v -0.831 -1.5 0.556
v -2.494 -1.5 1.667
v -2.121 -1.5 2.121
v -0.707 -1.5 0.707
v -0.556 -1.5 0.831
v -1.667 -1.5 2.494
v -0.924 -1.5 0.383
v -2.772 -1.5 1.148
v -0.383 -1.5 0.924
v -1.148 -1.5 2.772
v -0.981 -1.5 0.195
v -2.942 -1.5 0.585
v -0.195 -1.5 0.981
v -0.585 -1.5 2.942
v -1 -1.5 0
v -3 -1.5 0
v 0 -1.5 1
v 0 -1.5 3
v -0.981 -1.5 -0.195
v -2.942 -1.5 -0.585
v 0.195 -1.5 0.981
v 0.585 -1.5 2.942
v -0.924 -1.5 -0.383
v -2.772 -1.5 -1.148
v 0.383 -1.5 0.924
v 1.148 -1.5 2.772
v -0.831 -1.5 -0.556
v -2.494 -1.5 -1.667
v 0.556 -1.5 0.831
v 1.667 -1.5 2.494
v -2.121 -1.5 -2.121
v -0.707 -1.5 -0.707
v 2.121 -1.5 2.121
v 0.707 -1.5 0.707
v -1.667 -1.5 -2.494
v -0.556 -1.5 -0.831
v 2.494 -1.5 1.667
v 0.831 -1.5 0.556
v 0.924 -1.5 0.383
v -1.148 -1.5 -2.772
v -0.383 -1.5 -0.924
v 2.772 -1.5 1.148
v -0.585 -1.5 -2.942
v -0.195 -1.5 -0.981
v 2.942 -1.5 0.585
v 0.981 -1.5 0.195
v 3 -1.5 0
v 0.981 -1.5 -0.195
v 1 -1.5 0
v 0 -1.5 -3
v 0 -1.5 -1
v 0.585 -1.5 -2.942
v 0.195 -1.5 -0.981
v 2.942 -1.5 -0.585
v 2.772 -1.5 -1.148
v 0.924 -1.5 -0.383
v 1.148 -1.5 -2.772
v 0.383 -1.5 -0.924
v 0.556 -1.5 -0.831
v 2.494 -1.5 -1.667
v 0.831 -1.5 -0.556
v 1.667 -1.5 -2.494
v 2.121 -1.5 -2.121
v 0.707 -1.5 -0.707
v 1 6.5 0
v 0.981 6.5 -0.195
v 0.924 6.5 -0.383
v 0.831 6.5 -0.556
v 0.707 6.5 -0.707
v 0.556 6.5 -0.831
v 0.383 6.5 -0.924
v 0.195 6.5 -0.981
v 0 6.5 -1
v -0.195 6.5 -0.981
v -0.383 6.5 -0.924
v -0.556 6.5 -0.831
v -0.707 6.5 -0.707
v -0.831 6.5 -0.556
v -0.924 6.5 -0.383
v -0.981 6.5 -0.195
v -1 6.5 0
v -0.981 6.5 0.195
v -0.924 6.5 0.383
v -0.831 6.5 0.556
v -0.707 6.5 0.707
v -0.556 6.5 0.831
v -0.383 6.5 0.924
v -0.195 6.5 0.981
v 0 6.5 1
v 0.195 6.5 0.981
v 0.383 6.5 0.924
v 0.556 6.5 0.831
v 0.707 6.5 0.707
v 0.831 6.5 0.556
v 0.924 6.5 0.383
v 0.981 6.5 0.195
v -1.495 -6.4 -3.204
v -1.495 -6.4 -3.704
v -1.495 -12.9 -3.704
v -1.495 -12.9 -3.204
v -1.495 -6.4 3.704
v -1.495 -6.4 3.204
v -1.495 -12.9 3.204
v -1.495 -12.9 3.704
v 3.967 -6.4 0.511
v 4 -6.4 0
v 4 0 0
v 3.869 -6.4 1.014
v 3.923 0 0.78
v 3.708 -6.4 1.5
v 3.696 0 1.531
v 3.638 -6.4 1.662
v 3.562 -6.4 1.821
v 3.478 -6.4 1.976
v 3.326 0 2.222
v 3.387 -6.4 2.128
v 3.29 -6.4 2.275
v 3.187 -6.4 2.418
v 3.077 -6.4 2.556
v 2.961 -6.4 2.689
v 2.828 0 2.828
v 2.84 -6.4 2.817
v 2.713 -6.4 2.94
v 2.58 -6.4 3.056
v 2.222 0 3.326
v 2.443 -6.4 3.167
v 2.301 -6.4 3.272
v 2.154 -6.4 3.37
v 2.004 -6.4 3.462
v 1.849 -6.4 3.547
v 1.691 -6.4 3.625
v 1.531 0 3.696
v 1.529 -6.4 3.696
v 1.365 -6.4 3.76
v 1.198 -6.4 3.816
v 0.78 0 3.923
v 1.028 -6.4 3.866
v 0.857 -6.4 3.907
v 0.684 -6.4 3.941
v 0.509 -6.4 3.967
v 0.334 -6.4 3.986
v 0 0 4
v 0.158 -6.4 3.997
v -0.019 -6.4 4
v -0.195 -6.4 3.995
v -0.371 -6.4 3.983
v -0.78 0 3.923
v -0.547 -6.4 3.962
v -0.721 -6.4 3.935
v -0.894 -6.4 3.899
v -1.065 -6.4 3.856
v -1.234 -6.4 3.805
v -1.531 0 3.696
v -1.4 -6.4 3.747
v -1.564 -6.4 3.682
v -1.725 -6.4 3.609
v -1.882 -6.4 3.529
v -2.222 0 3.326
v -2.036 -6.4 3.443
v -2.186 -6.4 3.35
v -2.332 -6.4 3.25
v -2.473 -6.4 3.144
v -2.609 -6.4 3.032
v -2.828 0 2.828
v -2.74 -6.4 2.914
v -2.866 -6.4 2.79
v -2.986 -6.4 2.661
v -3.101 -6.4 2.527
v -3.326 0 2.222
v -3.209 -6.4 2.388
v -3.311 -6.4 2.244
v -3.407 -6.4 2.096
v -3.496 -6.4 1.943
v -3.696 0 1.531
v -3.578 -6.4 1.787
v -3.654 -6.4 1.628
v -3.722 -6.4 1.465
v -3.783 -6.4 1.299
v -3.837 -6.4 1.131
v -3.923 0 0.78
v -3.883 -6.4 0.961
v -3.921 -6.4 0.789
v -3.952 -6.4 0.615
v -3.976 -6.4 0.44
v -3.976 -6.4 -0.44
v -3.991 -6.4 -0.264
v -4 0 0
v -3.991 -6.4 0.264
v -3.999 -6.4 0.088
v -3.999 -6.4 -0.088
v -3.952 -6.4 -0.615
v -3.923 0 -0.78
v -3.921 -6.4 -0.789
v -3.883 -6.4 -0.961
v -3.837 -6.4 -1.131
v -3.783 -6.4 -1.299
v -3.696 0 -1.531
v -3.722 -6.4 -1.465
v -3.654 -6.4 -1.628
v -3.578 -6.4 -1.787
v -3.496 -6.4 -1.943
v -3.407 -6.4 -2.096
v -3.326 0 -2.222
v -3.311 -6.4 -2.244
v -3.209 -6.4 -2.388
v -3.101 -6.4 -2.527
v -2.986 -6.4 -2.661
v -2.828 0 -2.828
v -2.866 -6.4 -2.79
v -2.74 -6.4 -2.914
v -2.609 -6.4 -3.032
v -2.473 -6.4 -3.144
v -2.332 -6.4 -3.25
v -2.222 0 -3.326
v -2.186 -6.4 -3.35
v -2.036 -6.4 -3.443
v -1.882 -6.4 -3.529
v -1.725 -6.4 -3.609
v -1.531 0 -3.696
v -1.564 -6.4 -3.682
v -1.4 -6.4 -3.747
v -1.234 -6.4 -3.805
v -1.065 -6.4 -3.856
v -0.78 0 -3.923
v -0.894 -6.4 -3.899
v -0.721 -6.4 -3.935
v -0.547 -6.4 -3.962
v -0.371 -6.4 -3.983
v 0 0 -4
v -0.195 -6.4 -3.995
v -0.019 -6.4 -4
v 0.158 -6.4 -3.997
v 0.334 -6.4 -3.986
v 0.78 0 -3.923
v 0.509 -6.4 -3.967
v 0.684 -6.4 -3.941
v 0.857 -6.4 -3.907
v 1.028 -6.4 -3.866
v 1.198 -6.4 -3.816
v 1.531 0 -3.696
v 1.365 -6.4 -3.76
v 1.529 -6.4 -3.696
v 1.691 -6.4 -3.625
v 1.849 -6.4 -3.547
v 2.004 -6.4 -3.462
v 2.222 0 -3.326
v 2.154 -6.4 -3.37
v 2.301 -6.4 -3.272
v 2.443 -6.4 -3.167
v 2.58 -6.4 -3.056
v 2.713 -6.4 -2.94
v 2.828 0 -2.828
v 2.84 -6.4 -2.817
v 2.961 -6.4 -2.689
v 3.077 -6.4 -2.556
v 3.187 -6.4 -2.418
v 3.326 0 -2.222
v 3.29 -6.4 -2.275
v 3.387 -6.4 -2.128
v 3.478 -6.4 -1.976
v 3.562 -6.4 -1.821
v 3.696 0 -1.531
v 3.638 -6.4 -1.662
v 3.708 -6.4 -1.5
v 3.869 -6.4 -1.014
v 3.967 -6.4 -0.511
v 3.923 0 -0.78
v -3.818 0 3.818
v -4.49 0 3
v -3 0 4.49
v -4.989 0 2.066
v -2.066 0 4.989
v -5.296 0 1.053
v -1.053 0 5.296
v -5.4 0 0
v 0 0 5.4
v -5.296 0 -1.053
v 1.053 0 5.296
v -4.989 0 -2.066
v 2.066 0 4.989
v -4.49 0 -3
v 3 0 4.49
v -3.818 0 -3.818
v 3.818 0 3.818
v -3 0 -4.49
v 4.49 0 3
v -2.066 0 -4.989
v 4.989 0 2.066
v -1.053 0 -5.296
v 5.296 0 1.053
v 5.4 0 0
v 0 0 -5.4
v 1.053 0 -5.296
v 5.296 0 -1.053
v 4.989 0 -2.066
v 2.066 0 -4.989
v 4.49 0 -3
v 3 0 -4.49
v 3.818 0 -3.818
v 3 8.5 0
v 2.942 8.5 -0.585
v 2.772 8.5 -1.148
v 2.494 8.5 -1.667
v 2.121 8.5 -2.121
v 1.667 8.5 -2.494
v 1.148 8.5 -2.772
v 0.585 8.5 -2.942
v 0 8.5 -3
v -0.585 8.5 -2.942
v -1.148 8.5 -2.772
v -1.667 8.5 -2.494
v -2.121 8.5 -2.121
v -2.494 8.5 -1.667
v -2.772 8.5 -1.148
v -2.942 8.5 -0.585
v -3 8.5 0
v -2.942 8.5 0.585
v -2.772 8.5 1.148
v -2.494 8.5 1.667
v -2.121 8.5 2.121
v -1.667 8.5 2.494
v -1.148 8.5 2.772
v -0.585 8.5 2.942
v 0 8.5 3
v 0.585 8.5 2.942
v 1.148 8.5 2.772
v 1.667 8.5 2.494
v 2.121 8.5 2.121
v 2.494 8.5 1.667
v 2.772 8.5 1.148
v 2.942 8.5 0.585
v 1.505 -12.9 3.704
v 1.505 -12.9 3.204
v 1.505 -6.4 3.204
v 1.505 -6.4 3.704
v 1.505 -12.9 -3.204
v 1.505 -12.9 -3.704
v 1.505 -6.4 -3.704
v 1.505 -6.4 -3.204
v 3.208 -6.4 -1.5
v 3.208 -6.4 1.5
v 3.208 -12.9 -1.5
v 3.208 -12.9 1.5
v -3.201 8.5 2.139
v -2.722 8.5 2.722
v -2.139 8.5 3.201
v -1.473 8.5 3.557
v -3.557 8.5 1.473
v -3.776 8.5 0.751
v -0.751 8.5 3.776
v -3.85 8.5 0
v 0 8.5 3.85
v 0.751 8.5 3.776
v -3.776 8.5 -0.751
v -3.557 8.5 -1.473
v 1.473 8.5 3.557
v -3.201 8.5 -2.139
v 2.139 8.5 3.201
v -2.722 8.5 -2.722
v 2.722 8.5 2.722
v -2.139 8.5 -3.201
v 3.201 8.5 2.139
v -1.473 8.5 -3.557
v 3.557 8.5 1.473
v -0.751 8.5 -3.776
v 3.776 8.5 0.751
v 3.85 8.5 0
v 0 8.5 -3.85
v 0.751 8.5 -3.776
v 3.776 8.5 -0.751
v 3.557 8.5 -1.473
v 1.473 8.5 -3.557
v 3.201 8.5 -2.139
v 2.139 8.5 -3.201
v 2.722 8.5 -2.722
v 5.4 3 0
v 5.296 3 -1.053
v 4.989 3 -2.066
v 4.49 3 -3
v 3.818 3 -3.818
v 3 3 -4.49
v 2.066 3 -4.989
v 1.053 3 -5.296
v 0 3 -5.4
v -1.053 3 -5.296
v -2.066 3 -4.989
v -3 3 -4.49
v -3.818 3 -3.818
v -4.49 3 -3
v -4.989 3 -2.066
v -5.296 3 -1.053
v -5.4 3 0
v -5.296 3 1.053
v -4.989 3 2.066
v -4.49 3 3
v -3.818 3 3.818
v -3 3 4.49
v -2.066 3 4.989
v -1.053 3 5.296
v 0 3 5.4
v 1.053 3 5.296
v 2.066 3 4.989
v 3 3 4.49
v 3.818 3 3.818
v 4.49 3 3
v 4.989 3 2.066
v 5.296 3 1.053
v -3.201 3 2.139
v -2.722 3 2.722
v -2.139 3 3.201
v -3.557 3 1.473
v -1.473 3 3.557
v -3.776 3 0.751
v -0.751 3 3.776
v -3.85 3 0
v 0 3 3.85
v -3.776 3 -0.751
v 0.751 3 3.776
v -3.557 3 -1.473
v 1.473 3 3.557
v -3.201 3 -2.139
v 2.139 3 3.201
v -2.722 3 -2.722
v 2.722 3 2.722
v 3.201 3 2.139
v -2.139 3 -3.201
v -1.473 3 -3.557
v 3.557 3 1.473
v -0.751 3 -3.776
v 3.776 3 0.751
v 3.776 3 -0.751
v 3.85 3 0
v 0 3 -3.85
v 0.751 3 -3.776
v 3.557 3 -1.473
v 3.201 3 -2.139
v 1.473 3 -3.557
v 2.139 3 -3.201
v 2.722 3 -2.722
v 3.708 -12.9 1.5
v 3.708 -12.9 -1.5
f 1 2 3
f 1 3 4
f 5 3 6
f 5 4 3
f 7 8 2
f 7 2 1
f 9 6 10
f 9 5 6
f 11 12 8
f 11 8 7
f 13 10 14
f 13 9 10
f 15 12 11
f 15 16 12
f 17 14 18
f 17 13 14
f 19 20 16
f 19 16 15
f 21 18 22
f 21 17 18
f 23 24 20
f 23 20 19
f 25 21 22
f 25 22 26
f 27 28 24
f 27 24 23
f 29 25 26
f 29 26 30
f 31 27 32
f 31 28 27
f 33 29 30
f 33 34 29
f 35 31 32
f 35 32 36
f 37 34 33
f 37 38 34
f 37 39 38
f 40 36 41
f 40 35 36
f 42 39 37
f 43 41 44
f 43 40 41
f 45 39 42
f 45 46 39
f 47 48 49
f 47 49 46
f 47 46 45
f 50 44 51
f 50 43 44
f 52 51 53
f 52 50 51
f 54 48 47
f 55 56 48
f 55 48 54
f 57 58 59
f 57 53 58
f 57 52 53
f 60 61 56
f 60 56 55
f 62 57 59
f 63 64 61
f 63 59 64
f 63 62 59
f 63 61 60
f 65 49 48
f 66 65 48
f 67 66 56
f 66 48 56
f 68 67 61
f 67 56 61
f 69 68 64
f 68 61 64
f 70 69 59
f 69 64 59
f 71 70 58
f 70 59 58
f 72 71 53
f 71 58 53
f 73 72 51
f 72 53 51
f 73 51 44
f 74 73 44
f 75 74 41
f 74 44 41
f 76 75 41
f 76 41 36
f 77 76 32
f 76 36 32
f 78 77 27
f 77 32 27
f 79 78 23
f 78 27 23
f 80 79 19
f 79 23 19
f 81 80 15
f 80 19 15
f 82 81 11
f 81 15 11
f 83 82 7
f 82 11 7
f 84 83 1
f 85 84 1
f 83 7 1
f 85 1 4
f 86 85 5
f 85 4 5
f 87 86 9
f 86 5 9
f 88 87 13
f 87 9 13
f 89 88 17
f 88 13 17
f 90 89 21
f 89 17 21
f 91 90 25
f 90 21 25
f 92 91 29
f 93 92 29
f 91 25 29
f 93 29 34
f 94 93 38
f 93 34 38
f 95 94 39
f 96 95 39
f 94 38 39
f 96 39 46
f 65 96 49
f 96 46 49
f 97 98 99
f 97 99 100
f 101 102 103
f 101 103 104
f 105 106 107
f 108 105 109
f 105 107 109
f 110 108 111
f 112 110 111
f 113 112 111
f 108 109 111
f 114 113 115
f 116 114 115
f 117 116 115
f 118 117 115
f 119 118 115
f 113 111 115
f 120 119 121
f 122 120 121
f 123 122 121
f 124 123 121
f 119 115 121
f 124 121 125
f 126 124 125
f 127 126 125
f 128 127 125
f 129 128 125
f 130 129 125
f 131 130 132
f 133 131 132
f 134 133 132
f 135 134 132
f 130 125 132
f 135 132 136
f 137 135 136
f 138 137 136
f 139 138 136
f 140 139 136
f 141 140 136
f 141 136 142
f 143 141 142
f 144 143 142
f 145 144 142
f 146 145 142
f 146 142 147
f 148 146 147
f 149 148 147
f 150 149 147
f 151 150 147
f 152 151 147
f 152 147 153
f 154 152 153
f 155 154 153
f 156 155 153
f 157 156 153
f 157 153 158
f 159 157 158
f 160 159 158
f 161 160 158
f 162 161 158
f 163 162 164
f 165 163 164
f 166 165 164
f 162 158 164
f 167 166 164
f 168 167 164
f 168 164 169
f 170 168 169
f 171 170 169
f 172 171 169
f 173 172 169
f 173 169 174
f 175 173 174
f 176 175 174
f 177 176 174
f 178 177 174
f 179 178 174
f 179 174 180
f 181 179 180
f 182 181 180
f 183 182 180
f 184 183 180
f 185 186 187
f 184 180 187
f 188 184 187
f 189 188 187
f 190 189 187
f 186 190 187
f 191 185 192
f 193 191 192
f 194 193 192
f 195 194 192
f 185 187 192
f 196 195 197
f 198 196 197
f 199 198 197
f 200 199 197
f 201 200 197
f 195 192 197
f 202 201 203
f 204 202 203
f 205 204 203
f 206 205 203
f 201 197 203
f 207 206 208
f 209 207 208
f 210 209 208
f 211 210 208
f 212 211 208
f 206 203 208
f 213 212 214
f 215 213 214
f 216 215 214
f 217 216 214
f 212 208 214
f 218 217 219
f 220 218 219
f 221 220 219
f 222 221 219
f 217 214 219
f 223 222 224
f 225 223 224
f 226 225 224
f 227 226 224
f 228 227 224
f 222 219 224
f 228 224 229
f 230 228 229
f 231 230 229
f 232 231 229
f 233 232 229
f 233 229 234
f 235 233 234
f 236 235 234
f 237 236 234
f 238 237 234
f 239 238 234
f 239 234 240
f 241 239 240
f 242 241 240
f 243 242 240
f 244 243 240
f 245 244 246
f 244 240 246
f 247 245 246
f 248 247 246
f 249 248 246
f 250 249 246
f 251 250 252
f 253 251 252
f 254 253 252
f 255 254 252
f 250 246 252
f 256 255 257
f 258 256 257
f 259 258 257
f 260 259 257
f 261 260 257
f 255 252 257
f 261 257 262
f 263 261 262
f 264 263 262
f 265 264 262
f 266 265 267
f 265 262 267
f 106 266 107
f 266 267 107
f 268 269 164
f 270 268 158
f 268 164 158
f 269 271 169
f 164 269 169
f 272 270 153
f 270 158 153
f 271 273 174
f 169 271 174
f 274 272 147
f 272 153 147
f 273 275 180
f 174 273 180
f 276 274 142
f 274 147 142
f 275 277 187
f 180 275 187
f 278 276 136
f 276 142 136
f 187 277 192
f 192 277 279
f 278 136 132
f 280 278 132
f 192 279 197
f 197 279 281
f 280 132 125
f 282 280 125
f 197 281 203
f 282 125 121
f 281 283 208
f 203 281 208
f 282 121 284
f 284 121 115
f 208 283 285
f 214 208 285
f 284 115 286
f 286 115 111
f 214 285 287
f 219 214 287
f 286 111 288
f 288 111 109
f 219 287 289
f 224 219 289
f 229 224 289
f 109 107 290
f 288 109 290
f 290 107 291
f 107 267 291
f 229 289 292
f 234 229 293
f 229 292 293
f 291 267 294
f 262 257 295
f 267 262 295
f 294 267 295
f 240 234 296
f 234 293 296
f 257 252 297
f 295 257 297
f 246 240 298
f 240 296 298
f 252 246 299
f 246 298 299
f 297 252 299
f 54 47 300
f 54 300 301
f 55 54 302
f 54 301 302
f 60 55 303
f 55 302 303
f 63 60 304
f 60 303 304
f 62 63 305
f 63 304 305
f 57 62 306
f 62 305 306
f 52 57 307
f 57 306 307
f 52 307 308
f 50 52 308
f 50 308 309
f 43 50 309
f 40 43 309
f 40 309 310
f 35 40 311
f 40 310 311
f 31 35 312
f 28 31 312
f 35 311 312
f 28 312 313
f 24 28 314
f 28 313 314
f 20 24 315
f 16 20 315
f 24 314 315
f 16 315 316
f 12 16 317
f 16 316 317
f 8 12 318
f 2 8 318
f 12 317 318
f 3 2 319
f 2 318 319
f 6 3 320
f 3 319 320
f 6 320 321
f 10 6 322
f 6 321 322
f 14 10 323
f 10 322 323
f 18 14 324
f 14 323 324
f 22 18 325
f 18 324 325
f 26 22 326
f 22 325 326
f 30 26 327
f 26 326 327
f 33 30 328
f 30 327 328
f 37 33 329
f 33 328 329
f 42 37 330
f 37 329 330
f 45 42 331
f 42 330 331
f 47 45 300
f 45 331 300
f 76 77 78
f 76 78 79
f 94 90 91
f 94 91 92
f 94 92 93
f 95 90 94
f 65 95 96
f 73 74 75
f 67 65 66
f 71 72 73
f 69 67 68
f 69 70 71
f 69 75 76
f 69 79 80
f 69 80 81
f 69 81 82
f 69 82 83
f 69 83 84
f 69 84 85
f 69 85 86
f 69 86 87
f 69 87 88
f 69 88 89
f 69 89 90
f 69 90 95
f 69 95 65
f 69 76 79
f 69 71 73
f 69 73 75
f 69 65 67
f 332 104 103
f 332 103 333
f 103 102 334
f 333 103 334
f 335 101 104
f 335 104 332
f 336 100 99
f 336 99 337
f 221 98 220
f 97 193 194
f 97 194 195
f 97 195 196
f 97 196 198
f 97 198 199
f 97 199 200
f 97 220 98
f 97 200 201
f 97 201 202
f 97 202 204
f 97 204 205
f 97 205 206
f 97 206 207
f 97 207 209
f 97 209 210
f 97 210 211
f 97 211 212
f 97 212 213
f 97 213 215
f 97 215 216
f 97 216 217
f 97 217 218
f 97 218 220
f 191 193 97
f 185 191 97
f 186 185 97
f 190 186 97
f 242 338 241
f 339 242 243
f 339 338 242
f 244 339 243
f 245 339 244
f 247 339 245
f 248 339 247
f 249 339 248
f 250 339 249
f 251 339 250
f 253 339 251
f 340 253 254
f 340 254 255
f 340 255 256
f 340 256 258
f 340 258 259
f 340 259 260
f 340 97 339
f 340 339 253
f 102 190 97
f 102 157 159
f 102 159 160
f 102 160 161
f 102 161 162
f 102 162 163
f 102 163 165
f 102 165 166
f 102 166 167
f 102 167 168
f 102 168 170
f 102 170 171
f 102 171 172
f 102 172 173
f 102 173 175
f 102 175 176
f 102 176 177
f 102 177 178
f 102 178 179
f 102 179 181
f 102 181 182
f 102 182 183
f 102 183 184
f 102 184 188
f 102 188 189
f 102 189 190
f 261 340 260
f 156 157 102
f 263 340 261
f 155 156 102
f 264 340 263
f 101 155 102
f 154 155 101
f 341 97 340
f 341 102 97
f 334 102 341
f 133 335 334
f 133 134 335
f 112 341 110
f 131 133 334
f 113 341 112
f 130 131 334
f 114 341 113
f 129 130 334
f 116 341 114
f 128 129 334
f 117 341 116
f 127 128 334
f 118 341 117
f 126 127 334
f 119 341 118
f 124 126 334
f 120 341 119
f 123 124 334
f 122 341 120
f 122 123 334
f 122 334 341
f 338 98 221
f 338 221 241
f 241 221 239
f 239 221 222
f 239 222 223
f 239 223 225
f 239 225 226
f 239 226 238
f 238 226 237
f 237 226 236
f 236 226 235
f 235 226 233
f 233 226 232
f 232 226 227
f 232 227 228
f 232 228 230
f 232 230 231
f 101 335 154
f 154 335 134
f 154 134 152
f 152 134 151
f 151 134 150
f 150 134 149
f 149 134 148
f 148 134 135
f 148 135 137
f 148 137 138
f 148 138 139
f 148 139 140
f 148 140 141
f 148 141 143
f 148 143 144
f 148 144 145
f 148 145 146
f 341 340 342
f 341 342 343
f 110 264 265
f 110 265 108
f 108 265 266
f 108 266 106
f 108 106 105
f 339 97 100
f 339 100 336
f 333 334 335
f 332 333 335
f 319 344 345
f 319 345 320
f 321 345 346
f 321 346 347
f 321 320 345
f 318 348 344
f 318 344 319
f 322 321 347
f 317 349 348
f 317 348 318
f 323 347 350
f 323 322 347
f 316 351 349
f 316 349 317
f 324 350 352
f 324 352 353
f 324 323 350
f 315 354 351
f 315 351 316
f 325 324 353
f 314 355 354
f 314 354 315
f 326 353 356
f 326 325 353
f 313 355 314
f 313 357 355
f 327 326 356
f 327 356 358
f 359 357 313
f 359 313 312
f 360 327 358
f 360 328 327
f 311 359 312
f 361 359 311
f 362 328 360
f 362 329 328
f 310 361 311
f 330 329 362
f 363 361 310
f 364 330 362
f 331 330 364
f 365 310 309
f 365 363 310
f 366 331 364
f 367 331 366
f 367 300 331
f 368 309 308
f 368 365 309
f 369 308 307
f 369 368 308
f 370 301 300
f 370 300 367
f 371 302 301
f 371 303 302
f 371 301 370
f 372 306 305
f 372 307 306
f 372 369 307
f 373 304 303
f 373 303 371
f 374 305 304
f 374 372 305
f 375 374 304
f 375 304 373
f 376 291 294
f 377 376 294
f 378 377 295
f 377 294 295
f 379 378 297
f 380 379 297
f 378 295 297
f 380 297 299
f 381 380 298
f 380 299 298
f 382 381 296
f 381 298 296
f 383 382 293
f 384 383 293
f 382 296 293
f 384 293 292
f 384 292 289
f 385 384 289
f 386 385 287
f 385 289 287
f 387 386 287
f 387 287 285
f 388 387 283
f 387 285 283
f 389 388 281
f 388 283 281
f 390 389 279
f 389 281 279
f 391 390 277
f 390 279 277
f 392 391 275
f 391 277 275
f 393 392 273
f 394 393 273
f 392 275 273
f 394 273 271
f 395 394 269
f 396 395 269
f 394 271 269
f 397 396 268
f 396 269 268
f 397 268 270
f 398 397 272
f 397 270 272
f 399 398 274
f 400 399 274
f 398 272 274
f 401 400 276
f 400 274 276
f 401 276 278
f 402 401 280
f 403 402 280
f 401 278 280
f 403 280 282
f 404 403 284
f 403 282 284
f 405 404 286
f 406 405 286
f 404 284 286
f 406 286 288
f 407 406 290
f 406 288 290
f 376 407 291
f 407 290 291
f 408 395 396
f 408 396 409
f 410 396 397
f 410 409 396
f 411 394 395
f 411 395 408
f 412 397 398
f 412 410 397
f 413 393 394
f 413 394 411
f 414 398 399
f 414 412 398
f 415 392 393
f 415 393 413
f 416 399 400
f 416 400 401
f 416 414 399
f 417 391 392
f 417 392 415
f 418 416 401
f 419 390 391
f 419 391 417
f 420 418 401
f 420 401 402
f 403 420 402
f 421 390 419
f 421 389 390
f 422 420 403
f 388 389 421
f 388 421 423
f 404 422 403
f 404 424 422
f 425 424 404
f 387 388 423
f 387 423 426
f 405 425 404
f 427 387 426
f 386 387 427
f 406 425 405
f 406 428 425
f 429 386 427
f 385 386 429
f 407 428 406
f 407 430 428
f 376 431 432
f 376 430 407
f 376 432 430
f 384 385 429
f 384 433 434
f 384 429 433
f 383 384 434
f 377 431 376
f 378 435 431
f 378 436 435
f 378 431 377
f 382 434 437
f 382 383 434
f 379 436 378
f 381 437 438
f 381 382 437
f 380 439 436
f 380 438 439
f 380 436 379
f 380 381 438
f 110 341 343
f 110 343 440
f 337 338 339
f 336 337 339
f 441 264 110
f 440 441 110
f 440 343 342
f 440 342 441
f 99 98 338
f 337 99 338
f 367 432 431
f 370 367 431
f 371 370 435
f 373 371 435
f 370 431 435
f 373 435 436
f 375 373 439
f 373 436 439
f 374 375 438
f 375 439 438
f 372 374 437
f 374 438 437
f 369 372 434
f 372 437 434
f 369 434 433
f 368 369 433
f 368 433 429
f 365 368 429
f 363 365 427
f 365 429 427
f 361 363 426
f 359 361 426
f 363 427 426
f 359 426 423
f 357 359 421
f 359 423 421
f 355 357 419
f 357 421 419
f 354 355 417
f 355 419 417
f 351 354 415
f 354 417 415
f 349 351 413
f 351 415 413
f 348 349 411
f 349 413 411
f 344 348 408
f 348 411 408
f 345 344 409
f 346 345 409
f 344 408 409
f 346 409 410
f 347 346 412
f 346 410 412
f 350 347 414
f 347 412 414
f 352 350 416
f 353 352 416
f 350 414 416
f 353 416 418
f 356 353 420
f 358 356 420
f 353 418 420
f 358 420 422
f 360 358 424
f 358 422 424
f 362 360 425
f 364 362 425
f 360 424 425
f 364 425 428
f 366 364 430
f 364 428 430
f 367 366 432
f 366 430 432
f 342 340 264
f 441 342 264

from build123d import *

# Parameters (mm, degrees)
ESQUISSE1_R             = 5.4
BOSS_EXTRU_1_DEPTH      = 3
ESQUISSE2_R             = 3.85
BOSS_EXTRU_2_DEPTH      = 5.5
ESQUISSE3_R             = 4
BOSS_EXTRU_3_DEPTH      = 6.4
ESQUISSE4_W             = 3
ESQUISSE4_H             = 0.5
ESQUISSE4_W_2           = 0.5
ESQUISSE4_H_2           = 3
BOSS_EXTRU_4_DEPTH      = 6.5
ESQUISSE5_R             = 3
ENL_V_MAT_EXTRU_1_DEPTH = 10
ESQUISSE6_R             = 1
BOSS_EXTRU_5_DEPTH      = 8


with BuildPart() as part:
    # Esquisse1 → Boss.-Extru.1 (new body)
    with BuildSketch(Plane(origin=(0, 0, 0), x_dir=(1, 0, 0), z_dir=(0, 1, 0))):
        Circle(ESQUISSE1_R)
    extrude(amount=BOSS_EXTRU_1_DEPTH)

    # Esquisse2 → Boss.-Extru.2 (add)
    with BuildSketch(Plane(origin=(0, 3, 0), x_dir=(1, 0, 0), z_dir=(0, 1, 0))):
        Circle(ESQUISSE2_R)
    extrude(amount=BOSS_EXTRU_2_DEPTH)

    # Esquisse3 → Boss.-Extru.3 (add)
    with BuildSketch(Plane.XZ):
        Circle(ESQUISSE3_R)
    extrude(amount=BOSS_EXTRU_3_DEPTH)

    # Esquisse4 → Boss.-Extru.4 (add)
    with BuildSketch(Plane.XZ.offset(6.4)):
        with Locations((0.005129852, -3.453606957)):
            Rectangle(ESQUISSE4_W, ESQUISSE4_H)
        with Locations((0.005129852, 3.453606957)):
            Rectangle(ESQUISSE4_W, ESQUISSE4_H)
        with Locations((3.458099244, 0)):
            Rectangle(ESQUISSE4_W_2, ESQUISSE4_H_2)
    extrude(amount=BOSS_EXTRU_4_DEPTH)

    # Esquisse5 → Enlèv. mat.-Extru.1 (cut)
    with BuildSketch(Plane(origin=(0, 8.5, 0), x_dir=(1, 0, 0), z_dir=(0, 1, 0))):
        Circle(ESQUISSE5_R)
    extrude(amount=-ENL_V_MAT_EXTRU_1_DEPTH, mode=Mode.SUBTRACT)

    # Esquisse6 → Boss.-Extru.5 (add)
    with BuildSketch(Plane(origin=(0, -1.5, 0), x_dir=(1, 0, 0), z_dir=(0, 1, 0))):
        Circle(ESQUISSE6_R)
    extrude(amount=BOSS_EXTRU_5_DEPTH)


solid = part.part
